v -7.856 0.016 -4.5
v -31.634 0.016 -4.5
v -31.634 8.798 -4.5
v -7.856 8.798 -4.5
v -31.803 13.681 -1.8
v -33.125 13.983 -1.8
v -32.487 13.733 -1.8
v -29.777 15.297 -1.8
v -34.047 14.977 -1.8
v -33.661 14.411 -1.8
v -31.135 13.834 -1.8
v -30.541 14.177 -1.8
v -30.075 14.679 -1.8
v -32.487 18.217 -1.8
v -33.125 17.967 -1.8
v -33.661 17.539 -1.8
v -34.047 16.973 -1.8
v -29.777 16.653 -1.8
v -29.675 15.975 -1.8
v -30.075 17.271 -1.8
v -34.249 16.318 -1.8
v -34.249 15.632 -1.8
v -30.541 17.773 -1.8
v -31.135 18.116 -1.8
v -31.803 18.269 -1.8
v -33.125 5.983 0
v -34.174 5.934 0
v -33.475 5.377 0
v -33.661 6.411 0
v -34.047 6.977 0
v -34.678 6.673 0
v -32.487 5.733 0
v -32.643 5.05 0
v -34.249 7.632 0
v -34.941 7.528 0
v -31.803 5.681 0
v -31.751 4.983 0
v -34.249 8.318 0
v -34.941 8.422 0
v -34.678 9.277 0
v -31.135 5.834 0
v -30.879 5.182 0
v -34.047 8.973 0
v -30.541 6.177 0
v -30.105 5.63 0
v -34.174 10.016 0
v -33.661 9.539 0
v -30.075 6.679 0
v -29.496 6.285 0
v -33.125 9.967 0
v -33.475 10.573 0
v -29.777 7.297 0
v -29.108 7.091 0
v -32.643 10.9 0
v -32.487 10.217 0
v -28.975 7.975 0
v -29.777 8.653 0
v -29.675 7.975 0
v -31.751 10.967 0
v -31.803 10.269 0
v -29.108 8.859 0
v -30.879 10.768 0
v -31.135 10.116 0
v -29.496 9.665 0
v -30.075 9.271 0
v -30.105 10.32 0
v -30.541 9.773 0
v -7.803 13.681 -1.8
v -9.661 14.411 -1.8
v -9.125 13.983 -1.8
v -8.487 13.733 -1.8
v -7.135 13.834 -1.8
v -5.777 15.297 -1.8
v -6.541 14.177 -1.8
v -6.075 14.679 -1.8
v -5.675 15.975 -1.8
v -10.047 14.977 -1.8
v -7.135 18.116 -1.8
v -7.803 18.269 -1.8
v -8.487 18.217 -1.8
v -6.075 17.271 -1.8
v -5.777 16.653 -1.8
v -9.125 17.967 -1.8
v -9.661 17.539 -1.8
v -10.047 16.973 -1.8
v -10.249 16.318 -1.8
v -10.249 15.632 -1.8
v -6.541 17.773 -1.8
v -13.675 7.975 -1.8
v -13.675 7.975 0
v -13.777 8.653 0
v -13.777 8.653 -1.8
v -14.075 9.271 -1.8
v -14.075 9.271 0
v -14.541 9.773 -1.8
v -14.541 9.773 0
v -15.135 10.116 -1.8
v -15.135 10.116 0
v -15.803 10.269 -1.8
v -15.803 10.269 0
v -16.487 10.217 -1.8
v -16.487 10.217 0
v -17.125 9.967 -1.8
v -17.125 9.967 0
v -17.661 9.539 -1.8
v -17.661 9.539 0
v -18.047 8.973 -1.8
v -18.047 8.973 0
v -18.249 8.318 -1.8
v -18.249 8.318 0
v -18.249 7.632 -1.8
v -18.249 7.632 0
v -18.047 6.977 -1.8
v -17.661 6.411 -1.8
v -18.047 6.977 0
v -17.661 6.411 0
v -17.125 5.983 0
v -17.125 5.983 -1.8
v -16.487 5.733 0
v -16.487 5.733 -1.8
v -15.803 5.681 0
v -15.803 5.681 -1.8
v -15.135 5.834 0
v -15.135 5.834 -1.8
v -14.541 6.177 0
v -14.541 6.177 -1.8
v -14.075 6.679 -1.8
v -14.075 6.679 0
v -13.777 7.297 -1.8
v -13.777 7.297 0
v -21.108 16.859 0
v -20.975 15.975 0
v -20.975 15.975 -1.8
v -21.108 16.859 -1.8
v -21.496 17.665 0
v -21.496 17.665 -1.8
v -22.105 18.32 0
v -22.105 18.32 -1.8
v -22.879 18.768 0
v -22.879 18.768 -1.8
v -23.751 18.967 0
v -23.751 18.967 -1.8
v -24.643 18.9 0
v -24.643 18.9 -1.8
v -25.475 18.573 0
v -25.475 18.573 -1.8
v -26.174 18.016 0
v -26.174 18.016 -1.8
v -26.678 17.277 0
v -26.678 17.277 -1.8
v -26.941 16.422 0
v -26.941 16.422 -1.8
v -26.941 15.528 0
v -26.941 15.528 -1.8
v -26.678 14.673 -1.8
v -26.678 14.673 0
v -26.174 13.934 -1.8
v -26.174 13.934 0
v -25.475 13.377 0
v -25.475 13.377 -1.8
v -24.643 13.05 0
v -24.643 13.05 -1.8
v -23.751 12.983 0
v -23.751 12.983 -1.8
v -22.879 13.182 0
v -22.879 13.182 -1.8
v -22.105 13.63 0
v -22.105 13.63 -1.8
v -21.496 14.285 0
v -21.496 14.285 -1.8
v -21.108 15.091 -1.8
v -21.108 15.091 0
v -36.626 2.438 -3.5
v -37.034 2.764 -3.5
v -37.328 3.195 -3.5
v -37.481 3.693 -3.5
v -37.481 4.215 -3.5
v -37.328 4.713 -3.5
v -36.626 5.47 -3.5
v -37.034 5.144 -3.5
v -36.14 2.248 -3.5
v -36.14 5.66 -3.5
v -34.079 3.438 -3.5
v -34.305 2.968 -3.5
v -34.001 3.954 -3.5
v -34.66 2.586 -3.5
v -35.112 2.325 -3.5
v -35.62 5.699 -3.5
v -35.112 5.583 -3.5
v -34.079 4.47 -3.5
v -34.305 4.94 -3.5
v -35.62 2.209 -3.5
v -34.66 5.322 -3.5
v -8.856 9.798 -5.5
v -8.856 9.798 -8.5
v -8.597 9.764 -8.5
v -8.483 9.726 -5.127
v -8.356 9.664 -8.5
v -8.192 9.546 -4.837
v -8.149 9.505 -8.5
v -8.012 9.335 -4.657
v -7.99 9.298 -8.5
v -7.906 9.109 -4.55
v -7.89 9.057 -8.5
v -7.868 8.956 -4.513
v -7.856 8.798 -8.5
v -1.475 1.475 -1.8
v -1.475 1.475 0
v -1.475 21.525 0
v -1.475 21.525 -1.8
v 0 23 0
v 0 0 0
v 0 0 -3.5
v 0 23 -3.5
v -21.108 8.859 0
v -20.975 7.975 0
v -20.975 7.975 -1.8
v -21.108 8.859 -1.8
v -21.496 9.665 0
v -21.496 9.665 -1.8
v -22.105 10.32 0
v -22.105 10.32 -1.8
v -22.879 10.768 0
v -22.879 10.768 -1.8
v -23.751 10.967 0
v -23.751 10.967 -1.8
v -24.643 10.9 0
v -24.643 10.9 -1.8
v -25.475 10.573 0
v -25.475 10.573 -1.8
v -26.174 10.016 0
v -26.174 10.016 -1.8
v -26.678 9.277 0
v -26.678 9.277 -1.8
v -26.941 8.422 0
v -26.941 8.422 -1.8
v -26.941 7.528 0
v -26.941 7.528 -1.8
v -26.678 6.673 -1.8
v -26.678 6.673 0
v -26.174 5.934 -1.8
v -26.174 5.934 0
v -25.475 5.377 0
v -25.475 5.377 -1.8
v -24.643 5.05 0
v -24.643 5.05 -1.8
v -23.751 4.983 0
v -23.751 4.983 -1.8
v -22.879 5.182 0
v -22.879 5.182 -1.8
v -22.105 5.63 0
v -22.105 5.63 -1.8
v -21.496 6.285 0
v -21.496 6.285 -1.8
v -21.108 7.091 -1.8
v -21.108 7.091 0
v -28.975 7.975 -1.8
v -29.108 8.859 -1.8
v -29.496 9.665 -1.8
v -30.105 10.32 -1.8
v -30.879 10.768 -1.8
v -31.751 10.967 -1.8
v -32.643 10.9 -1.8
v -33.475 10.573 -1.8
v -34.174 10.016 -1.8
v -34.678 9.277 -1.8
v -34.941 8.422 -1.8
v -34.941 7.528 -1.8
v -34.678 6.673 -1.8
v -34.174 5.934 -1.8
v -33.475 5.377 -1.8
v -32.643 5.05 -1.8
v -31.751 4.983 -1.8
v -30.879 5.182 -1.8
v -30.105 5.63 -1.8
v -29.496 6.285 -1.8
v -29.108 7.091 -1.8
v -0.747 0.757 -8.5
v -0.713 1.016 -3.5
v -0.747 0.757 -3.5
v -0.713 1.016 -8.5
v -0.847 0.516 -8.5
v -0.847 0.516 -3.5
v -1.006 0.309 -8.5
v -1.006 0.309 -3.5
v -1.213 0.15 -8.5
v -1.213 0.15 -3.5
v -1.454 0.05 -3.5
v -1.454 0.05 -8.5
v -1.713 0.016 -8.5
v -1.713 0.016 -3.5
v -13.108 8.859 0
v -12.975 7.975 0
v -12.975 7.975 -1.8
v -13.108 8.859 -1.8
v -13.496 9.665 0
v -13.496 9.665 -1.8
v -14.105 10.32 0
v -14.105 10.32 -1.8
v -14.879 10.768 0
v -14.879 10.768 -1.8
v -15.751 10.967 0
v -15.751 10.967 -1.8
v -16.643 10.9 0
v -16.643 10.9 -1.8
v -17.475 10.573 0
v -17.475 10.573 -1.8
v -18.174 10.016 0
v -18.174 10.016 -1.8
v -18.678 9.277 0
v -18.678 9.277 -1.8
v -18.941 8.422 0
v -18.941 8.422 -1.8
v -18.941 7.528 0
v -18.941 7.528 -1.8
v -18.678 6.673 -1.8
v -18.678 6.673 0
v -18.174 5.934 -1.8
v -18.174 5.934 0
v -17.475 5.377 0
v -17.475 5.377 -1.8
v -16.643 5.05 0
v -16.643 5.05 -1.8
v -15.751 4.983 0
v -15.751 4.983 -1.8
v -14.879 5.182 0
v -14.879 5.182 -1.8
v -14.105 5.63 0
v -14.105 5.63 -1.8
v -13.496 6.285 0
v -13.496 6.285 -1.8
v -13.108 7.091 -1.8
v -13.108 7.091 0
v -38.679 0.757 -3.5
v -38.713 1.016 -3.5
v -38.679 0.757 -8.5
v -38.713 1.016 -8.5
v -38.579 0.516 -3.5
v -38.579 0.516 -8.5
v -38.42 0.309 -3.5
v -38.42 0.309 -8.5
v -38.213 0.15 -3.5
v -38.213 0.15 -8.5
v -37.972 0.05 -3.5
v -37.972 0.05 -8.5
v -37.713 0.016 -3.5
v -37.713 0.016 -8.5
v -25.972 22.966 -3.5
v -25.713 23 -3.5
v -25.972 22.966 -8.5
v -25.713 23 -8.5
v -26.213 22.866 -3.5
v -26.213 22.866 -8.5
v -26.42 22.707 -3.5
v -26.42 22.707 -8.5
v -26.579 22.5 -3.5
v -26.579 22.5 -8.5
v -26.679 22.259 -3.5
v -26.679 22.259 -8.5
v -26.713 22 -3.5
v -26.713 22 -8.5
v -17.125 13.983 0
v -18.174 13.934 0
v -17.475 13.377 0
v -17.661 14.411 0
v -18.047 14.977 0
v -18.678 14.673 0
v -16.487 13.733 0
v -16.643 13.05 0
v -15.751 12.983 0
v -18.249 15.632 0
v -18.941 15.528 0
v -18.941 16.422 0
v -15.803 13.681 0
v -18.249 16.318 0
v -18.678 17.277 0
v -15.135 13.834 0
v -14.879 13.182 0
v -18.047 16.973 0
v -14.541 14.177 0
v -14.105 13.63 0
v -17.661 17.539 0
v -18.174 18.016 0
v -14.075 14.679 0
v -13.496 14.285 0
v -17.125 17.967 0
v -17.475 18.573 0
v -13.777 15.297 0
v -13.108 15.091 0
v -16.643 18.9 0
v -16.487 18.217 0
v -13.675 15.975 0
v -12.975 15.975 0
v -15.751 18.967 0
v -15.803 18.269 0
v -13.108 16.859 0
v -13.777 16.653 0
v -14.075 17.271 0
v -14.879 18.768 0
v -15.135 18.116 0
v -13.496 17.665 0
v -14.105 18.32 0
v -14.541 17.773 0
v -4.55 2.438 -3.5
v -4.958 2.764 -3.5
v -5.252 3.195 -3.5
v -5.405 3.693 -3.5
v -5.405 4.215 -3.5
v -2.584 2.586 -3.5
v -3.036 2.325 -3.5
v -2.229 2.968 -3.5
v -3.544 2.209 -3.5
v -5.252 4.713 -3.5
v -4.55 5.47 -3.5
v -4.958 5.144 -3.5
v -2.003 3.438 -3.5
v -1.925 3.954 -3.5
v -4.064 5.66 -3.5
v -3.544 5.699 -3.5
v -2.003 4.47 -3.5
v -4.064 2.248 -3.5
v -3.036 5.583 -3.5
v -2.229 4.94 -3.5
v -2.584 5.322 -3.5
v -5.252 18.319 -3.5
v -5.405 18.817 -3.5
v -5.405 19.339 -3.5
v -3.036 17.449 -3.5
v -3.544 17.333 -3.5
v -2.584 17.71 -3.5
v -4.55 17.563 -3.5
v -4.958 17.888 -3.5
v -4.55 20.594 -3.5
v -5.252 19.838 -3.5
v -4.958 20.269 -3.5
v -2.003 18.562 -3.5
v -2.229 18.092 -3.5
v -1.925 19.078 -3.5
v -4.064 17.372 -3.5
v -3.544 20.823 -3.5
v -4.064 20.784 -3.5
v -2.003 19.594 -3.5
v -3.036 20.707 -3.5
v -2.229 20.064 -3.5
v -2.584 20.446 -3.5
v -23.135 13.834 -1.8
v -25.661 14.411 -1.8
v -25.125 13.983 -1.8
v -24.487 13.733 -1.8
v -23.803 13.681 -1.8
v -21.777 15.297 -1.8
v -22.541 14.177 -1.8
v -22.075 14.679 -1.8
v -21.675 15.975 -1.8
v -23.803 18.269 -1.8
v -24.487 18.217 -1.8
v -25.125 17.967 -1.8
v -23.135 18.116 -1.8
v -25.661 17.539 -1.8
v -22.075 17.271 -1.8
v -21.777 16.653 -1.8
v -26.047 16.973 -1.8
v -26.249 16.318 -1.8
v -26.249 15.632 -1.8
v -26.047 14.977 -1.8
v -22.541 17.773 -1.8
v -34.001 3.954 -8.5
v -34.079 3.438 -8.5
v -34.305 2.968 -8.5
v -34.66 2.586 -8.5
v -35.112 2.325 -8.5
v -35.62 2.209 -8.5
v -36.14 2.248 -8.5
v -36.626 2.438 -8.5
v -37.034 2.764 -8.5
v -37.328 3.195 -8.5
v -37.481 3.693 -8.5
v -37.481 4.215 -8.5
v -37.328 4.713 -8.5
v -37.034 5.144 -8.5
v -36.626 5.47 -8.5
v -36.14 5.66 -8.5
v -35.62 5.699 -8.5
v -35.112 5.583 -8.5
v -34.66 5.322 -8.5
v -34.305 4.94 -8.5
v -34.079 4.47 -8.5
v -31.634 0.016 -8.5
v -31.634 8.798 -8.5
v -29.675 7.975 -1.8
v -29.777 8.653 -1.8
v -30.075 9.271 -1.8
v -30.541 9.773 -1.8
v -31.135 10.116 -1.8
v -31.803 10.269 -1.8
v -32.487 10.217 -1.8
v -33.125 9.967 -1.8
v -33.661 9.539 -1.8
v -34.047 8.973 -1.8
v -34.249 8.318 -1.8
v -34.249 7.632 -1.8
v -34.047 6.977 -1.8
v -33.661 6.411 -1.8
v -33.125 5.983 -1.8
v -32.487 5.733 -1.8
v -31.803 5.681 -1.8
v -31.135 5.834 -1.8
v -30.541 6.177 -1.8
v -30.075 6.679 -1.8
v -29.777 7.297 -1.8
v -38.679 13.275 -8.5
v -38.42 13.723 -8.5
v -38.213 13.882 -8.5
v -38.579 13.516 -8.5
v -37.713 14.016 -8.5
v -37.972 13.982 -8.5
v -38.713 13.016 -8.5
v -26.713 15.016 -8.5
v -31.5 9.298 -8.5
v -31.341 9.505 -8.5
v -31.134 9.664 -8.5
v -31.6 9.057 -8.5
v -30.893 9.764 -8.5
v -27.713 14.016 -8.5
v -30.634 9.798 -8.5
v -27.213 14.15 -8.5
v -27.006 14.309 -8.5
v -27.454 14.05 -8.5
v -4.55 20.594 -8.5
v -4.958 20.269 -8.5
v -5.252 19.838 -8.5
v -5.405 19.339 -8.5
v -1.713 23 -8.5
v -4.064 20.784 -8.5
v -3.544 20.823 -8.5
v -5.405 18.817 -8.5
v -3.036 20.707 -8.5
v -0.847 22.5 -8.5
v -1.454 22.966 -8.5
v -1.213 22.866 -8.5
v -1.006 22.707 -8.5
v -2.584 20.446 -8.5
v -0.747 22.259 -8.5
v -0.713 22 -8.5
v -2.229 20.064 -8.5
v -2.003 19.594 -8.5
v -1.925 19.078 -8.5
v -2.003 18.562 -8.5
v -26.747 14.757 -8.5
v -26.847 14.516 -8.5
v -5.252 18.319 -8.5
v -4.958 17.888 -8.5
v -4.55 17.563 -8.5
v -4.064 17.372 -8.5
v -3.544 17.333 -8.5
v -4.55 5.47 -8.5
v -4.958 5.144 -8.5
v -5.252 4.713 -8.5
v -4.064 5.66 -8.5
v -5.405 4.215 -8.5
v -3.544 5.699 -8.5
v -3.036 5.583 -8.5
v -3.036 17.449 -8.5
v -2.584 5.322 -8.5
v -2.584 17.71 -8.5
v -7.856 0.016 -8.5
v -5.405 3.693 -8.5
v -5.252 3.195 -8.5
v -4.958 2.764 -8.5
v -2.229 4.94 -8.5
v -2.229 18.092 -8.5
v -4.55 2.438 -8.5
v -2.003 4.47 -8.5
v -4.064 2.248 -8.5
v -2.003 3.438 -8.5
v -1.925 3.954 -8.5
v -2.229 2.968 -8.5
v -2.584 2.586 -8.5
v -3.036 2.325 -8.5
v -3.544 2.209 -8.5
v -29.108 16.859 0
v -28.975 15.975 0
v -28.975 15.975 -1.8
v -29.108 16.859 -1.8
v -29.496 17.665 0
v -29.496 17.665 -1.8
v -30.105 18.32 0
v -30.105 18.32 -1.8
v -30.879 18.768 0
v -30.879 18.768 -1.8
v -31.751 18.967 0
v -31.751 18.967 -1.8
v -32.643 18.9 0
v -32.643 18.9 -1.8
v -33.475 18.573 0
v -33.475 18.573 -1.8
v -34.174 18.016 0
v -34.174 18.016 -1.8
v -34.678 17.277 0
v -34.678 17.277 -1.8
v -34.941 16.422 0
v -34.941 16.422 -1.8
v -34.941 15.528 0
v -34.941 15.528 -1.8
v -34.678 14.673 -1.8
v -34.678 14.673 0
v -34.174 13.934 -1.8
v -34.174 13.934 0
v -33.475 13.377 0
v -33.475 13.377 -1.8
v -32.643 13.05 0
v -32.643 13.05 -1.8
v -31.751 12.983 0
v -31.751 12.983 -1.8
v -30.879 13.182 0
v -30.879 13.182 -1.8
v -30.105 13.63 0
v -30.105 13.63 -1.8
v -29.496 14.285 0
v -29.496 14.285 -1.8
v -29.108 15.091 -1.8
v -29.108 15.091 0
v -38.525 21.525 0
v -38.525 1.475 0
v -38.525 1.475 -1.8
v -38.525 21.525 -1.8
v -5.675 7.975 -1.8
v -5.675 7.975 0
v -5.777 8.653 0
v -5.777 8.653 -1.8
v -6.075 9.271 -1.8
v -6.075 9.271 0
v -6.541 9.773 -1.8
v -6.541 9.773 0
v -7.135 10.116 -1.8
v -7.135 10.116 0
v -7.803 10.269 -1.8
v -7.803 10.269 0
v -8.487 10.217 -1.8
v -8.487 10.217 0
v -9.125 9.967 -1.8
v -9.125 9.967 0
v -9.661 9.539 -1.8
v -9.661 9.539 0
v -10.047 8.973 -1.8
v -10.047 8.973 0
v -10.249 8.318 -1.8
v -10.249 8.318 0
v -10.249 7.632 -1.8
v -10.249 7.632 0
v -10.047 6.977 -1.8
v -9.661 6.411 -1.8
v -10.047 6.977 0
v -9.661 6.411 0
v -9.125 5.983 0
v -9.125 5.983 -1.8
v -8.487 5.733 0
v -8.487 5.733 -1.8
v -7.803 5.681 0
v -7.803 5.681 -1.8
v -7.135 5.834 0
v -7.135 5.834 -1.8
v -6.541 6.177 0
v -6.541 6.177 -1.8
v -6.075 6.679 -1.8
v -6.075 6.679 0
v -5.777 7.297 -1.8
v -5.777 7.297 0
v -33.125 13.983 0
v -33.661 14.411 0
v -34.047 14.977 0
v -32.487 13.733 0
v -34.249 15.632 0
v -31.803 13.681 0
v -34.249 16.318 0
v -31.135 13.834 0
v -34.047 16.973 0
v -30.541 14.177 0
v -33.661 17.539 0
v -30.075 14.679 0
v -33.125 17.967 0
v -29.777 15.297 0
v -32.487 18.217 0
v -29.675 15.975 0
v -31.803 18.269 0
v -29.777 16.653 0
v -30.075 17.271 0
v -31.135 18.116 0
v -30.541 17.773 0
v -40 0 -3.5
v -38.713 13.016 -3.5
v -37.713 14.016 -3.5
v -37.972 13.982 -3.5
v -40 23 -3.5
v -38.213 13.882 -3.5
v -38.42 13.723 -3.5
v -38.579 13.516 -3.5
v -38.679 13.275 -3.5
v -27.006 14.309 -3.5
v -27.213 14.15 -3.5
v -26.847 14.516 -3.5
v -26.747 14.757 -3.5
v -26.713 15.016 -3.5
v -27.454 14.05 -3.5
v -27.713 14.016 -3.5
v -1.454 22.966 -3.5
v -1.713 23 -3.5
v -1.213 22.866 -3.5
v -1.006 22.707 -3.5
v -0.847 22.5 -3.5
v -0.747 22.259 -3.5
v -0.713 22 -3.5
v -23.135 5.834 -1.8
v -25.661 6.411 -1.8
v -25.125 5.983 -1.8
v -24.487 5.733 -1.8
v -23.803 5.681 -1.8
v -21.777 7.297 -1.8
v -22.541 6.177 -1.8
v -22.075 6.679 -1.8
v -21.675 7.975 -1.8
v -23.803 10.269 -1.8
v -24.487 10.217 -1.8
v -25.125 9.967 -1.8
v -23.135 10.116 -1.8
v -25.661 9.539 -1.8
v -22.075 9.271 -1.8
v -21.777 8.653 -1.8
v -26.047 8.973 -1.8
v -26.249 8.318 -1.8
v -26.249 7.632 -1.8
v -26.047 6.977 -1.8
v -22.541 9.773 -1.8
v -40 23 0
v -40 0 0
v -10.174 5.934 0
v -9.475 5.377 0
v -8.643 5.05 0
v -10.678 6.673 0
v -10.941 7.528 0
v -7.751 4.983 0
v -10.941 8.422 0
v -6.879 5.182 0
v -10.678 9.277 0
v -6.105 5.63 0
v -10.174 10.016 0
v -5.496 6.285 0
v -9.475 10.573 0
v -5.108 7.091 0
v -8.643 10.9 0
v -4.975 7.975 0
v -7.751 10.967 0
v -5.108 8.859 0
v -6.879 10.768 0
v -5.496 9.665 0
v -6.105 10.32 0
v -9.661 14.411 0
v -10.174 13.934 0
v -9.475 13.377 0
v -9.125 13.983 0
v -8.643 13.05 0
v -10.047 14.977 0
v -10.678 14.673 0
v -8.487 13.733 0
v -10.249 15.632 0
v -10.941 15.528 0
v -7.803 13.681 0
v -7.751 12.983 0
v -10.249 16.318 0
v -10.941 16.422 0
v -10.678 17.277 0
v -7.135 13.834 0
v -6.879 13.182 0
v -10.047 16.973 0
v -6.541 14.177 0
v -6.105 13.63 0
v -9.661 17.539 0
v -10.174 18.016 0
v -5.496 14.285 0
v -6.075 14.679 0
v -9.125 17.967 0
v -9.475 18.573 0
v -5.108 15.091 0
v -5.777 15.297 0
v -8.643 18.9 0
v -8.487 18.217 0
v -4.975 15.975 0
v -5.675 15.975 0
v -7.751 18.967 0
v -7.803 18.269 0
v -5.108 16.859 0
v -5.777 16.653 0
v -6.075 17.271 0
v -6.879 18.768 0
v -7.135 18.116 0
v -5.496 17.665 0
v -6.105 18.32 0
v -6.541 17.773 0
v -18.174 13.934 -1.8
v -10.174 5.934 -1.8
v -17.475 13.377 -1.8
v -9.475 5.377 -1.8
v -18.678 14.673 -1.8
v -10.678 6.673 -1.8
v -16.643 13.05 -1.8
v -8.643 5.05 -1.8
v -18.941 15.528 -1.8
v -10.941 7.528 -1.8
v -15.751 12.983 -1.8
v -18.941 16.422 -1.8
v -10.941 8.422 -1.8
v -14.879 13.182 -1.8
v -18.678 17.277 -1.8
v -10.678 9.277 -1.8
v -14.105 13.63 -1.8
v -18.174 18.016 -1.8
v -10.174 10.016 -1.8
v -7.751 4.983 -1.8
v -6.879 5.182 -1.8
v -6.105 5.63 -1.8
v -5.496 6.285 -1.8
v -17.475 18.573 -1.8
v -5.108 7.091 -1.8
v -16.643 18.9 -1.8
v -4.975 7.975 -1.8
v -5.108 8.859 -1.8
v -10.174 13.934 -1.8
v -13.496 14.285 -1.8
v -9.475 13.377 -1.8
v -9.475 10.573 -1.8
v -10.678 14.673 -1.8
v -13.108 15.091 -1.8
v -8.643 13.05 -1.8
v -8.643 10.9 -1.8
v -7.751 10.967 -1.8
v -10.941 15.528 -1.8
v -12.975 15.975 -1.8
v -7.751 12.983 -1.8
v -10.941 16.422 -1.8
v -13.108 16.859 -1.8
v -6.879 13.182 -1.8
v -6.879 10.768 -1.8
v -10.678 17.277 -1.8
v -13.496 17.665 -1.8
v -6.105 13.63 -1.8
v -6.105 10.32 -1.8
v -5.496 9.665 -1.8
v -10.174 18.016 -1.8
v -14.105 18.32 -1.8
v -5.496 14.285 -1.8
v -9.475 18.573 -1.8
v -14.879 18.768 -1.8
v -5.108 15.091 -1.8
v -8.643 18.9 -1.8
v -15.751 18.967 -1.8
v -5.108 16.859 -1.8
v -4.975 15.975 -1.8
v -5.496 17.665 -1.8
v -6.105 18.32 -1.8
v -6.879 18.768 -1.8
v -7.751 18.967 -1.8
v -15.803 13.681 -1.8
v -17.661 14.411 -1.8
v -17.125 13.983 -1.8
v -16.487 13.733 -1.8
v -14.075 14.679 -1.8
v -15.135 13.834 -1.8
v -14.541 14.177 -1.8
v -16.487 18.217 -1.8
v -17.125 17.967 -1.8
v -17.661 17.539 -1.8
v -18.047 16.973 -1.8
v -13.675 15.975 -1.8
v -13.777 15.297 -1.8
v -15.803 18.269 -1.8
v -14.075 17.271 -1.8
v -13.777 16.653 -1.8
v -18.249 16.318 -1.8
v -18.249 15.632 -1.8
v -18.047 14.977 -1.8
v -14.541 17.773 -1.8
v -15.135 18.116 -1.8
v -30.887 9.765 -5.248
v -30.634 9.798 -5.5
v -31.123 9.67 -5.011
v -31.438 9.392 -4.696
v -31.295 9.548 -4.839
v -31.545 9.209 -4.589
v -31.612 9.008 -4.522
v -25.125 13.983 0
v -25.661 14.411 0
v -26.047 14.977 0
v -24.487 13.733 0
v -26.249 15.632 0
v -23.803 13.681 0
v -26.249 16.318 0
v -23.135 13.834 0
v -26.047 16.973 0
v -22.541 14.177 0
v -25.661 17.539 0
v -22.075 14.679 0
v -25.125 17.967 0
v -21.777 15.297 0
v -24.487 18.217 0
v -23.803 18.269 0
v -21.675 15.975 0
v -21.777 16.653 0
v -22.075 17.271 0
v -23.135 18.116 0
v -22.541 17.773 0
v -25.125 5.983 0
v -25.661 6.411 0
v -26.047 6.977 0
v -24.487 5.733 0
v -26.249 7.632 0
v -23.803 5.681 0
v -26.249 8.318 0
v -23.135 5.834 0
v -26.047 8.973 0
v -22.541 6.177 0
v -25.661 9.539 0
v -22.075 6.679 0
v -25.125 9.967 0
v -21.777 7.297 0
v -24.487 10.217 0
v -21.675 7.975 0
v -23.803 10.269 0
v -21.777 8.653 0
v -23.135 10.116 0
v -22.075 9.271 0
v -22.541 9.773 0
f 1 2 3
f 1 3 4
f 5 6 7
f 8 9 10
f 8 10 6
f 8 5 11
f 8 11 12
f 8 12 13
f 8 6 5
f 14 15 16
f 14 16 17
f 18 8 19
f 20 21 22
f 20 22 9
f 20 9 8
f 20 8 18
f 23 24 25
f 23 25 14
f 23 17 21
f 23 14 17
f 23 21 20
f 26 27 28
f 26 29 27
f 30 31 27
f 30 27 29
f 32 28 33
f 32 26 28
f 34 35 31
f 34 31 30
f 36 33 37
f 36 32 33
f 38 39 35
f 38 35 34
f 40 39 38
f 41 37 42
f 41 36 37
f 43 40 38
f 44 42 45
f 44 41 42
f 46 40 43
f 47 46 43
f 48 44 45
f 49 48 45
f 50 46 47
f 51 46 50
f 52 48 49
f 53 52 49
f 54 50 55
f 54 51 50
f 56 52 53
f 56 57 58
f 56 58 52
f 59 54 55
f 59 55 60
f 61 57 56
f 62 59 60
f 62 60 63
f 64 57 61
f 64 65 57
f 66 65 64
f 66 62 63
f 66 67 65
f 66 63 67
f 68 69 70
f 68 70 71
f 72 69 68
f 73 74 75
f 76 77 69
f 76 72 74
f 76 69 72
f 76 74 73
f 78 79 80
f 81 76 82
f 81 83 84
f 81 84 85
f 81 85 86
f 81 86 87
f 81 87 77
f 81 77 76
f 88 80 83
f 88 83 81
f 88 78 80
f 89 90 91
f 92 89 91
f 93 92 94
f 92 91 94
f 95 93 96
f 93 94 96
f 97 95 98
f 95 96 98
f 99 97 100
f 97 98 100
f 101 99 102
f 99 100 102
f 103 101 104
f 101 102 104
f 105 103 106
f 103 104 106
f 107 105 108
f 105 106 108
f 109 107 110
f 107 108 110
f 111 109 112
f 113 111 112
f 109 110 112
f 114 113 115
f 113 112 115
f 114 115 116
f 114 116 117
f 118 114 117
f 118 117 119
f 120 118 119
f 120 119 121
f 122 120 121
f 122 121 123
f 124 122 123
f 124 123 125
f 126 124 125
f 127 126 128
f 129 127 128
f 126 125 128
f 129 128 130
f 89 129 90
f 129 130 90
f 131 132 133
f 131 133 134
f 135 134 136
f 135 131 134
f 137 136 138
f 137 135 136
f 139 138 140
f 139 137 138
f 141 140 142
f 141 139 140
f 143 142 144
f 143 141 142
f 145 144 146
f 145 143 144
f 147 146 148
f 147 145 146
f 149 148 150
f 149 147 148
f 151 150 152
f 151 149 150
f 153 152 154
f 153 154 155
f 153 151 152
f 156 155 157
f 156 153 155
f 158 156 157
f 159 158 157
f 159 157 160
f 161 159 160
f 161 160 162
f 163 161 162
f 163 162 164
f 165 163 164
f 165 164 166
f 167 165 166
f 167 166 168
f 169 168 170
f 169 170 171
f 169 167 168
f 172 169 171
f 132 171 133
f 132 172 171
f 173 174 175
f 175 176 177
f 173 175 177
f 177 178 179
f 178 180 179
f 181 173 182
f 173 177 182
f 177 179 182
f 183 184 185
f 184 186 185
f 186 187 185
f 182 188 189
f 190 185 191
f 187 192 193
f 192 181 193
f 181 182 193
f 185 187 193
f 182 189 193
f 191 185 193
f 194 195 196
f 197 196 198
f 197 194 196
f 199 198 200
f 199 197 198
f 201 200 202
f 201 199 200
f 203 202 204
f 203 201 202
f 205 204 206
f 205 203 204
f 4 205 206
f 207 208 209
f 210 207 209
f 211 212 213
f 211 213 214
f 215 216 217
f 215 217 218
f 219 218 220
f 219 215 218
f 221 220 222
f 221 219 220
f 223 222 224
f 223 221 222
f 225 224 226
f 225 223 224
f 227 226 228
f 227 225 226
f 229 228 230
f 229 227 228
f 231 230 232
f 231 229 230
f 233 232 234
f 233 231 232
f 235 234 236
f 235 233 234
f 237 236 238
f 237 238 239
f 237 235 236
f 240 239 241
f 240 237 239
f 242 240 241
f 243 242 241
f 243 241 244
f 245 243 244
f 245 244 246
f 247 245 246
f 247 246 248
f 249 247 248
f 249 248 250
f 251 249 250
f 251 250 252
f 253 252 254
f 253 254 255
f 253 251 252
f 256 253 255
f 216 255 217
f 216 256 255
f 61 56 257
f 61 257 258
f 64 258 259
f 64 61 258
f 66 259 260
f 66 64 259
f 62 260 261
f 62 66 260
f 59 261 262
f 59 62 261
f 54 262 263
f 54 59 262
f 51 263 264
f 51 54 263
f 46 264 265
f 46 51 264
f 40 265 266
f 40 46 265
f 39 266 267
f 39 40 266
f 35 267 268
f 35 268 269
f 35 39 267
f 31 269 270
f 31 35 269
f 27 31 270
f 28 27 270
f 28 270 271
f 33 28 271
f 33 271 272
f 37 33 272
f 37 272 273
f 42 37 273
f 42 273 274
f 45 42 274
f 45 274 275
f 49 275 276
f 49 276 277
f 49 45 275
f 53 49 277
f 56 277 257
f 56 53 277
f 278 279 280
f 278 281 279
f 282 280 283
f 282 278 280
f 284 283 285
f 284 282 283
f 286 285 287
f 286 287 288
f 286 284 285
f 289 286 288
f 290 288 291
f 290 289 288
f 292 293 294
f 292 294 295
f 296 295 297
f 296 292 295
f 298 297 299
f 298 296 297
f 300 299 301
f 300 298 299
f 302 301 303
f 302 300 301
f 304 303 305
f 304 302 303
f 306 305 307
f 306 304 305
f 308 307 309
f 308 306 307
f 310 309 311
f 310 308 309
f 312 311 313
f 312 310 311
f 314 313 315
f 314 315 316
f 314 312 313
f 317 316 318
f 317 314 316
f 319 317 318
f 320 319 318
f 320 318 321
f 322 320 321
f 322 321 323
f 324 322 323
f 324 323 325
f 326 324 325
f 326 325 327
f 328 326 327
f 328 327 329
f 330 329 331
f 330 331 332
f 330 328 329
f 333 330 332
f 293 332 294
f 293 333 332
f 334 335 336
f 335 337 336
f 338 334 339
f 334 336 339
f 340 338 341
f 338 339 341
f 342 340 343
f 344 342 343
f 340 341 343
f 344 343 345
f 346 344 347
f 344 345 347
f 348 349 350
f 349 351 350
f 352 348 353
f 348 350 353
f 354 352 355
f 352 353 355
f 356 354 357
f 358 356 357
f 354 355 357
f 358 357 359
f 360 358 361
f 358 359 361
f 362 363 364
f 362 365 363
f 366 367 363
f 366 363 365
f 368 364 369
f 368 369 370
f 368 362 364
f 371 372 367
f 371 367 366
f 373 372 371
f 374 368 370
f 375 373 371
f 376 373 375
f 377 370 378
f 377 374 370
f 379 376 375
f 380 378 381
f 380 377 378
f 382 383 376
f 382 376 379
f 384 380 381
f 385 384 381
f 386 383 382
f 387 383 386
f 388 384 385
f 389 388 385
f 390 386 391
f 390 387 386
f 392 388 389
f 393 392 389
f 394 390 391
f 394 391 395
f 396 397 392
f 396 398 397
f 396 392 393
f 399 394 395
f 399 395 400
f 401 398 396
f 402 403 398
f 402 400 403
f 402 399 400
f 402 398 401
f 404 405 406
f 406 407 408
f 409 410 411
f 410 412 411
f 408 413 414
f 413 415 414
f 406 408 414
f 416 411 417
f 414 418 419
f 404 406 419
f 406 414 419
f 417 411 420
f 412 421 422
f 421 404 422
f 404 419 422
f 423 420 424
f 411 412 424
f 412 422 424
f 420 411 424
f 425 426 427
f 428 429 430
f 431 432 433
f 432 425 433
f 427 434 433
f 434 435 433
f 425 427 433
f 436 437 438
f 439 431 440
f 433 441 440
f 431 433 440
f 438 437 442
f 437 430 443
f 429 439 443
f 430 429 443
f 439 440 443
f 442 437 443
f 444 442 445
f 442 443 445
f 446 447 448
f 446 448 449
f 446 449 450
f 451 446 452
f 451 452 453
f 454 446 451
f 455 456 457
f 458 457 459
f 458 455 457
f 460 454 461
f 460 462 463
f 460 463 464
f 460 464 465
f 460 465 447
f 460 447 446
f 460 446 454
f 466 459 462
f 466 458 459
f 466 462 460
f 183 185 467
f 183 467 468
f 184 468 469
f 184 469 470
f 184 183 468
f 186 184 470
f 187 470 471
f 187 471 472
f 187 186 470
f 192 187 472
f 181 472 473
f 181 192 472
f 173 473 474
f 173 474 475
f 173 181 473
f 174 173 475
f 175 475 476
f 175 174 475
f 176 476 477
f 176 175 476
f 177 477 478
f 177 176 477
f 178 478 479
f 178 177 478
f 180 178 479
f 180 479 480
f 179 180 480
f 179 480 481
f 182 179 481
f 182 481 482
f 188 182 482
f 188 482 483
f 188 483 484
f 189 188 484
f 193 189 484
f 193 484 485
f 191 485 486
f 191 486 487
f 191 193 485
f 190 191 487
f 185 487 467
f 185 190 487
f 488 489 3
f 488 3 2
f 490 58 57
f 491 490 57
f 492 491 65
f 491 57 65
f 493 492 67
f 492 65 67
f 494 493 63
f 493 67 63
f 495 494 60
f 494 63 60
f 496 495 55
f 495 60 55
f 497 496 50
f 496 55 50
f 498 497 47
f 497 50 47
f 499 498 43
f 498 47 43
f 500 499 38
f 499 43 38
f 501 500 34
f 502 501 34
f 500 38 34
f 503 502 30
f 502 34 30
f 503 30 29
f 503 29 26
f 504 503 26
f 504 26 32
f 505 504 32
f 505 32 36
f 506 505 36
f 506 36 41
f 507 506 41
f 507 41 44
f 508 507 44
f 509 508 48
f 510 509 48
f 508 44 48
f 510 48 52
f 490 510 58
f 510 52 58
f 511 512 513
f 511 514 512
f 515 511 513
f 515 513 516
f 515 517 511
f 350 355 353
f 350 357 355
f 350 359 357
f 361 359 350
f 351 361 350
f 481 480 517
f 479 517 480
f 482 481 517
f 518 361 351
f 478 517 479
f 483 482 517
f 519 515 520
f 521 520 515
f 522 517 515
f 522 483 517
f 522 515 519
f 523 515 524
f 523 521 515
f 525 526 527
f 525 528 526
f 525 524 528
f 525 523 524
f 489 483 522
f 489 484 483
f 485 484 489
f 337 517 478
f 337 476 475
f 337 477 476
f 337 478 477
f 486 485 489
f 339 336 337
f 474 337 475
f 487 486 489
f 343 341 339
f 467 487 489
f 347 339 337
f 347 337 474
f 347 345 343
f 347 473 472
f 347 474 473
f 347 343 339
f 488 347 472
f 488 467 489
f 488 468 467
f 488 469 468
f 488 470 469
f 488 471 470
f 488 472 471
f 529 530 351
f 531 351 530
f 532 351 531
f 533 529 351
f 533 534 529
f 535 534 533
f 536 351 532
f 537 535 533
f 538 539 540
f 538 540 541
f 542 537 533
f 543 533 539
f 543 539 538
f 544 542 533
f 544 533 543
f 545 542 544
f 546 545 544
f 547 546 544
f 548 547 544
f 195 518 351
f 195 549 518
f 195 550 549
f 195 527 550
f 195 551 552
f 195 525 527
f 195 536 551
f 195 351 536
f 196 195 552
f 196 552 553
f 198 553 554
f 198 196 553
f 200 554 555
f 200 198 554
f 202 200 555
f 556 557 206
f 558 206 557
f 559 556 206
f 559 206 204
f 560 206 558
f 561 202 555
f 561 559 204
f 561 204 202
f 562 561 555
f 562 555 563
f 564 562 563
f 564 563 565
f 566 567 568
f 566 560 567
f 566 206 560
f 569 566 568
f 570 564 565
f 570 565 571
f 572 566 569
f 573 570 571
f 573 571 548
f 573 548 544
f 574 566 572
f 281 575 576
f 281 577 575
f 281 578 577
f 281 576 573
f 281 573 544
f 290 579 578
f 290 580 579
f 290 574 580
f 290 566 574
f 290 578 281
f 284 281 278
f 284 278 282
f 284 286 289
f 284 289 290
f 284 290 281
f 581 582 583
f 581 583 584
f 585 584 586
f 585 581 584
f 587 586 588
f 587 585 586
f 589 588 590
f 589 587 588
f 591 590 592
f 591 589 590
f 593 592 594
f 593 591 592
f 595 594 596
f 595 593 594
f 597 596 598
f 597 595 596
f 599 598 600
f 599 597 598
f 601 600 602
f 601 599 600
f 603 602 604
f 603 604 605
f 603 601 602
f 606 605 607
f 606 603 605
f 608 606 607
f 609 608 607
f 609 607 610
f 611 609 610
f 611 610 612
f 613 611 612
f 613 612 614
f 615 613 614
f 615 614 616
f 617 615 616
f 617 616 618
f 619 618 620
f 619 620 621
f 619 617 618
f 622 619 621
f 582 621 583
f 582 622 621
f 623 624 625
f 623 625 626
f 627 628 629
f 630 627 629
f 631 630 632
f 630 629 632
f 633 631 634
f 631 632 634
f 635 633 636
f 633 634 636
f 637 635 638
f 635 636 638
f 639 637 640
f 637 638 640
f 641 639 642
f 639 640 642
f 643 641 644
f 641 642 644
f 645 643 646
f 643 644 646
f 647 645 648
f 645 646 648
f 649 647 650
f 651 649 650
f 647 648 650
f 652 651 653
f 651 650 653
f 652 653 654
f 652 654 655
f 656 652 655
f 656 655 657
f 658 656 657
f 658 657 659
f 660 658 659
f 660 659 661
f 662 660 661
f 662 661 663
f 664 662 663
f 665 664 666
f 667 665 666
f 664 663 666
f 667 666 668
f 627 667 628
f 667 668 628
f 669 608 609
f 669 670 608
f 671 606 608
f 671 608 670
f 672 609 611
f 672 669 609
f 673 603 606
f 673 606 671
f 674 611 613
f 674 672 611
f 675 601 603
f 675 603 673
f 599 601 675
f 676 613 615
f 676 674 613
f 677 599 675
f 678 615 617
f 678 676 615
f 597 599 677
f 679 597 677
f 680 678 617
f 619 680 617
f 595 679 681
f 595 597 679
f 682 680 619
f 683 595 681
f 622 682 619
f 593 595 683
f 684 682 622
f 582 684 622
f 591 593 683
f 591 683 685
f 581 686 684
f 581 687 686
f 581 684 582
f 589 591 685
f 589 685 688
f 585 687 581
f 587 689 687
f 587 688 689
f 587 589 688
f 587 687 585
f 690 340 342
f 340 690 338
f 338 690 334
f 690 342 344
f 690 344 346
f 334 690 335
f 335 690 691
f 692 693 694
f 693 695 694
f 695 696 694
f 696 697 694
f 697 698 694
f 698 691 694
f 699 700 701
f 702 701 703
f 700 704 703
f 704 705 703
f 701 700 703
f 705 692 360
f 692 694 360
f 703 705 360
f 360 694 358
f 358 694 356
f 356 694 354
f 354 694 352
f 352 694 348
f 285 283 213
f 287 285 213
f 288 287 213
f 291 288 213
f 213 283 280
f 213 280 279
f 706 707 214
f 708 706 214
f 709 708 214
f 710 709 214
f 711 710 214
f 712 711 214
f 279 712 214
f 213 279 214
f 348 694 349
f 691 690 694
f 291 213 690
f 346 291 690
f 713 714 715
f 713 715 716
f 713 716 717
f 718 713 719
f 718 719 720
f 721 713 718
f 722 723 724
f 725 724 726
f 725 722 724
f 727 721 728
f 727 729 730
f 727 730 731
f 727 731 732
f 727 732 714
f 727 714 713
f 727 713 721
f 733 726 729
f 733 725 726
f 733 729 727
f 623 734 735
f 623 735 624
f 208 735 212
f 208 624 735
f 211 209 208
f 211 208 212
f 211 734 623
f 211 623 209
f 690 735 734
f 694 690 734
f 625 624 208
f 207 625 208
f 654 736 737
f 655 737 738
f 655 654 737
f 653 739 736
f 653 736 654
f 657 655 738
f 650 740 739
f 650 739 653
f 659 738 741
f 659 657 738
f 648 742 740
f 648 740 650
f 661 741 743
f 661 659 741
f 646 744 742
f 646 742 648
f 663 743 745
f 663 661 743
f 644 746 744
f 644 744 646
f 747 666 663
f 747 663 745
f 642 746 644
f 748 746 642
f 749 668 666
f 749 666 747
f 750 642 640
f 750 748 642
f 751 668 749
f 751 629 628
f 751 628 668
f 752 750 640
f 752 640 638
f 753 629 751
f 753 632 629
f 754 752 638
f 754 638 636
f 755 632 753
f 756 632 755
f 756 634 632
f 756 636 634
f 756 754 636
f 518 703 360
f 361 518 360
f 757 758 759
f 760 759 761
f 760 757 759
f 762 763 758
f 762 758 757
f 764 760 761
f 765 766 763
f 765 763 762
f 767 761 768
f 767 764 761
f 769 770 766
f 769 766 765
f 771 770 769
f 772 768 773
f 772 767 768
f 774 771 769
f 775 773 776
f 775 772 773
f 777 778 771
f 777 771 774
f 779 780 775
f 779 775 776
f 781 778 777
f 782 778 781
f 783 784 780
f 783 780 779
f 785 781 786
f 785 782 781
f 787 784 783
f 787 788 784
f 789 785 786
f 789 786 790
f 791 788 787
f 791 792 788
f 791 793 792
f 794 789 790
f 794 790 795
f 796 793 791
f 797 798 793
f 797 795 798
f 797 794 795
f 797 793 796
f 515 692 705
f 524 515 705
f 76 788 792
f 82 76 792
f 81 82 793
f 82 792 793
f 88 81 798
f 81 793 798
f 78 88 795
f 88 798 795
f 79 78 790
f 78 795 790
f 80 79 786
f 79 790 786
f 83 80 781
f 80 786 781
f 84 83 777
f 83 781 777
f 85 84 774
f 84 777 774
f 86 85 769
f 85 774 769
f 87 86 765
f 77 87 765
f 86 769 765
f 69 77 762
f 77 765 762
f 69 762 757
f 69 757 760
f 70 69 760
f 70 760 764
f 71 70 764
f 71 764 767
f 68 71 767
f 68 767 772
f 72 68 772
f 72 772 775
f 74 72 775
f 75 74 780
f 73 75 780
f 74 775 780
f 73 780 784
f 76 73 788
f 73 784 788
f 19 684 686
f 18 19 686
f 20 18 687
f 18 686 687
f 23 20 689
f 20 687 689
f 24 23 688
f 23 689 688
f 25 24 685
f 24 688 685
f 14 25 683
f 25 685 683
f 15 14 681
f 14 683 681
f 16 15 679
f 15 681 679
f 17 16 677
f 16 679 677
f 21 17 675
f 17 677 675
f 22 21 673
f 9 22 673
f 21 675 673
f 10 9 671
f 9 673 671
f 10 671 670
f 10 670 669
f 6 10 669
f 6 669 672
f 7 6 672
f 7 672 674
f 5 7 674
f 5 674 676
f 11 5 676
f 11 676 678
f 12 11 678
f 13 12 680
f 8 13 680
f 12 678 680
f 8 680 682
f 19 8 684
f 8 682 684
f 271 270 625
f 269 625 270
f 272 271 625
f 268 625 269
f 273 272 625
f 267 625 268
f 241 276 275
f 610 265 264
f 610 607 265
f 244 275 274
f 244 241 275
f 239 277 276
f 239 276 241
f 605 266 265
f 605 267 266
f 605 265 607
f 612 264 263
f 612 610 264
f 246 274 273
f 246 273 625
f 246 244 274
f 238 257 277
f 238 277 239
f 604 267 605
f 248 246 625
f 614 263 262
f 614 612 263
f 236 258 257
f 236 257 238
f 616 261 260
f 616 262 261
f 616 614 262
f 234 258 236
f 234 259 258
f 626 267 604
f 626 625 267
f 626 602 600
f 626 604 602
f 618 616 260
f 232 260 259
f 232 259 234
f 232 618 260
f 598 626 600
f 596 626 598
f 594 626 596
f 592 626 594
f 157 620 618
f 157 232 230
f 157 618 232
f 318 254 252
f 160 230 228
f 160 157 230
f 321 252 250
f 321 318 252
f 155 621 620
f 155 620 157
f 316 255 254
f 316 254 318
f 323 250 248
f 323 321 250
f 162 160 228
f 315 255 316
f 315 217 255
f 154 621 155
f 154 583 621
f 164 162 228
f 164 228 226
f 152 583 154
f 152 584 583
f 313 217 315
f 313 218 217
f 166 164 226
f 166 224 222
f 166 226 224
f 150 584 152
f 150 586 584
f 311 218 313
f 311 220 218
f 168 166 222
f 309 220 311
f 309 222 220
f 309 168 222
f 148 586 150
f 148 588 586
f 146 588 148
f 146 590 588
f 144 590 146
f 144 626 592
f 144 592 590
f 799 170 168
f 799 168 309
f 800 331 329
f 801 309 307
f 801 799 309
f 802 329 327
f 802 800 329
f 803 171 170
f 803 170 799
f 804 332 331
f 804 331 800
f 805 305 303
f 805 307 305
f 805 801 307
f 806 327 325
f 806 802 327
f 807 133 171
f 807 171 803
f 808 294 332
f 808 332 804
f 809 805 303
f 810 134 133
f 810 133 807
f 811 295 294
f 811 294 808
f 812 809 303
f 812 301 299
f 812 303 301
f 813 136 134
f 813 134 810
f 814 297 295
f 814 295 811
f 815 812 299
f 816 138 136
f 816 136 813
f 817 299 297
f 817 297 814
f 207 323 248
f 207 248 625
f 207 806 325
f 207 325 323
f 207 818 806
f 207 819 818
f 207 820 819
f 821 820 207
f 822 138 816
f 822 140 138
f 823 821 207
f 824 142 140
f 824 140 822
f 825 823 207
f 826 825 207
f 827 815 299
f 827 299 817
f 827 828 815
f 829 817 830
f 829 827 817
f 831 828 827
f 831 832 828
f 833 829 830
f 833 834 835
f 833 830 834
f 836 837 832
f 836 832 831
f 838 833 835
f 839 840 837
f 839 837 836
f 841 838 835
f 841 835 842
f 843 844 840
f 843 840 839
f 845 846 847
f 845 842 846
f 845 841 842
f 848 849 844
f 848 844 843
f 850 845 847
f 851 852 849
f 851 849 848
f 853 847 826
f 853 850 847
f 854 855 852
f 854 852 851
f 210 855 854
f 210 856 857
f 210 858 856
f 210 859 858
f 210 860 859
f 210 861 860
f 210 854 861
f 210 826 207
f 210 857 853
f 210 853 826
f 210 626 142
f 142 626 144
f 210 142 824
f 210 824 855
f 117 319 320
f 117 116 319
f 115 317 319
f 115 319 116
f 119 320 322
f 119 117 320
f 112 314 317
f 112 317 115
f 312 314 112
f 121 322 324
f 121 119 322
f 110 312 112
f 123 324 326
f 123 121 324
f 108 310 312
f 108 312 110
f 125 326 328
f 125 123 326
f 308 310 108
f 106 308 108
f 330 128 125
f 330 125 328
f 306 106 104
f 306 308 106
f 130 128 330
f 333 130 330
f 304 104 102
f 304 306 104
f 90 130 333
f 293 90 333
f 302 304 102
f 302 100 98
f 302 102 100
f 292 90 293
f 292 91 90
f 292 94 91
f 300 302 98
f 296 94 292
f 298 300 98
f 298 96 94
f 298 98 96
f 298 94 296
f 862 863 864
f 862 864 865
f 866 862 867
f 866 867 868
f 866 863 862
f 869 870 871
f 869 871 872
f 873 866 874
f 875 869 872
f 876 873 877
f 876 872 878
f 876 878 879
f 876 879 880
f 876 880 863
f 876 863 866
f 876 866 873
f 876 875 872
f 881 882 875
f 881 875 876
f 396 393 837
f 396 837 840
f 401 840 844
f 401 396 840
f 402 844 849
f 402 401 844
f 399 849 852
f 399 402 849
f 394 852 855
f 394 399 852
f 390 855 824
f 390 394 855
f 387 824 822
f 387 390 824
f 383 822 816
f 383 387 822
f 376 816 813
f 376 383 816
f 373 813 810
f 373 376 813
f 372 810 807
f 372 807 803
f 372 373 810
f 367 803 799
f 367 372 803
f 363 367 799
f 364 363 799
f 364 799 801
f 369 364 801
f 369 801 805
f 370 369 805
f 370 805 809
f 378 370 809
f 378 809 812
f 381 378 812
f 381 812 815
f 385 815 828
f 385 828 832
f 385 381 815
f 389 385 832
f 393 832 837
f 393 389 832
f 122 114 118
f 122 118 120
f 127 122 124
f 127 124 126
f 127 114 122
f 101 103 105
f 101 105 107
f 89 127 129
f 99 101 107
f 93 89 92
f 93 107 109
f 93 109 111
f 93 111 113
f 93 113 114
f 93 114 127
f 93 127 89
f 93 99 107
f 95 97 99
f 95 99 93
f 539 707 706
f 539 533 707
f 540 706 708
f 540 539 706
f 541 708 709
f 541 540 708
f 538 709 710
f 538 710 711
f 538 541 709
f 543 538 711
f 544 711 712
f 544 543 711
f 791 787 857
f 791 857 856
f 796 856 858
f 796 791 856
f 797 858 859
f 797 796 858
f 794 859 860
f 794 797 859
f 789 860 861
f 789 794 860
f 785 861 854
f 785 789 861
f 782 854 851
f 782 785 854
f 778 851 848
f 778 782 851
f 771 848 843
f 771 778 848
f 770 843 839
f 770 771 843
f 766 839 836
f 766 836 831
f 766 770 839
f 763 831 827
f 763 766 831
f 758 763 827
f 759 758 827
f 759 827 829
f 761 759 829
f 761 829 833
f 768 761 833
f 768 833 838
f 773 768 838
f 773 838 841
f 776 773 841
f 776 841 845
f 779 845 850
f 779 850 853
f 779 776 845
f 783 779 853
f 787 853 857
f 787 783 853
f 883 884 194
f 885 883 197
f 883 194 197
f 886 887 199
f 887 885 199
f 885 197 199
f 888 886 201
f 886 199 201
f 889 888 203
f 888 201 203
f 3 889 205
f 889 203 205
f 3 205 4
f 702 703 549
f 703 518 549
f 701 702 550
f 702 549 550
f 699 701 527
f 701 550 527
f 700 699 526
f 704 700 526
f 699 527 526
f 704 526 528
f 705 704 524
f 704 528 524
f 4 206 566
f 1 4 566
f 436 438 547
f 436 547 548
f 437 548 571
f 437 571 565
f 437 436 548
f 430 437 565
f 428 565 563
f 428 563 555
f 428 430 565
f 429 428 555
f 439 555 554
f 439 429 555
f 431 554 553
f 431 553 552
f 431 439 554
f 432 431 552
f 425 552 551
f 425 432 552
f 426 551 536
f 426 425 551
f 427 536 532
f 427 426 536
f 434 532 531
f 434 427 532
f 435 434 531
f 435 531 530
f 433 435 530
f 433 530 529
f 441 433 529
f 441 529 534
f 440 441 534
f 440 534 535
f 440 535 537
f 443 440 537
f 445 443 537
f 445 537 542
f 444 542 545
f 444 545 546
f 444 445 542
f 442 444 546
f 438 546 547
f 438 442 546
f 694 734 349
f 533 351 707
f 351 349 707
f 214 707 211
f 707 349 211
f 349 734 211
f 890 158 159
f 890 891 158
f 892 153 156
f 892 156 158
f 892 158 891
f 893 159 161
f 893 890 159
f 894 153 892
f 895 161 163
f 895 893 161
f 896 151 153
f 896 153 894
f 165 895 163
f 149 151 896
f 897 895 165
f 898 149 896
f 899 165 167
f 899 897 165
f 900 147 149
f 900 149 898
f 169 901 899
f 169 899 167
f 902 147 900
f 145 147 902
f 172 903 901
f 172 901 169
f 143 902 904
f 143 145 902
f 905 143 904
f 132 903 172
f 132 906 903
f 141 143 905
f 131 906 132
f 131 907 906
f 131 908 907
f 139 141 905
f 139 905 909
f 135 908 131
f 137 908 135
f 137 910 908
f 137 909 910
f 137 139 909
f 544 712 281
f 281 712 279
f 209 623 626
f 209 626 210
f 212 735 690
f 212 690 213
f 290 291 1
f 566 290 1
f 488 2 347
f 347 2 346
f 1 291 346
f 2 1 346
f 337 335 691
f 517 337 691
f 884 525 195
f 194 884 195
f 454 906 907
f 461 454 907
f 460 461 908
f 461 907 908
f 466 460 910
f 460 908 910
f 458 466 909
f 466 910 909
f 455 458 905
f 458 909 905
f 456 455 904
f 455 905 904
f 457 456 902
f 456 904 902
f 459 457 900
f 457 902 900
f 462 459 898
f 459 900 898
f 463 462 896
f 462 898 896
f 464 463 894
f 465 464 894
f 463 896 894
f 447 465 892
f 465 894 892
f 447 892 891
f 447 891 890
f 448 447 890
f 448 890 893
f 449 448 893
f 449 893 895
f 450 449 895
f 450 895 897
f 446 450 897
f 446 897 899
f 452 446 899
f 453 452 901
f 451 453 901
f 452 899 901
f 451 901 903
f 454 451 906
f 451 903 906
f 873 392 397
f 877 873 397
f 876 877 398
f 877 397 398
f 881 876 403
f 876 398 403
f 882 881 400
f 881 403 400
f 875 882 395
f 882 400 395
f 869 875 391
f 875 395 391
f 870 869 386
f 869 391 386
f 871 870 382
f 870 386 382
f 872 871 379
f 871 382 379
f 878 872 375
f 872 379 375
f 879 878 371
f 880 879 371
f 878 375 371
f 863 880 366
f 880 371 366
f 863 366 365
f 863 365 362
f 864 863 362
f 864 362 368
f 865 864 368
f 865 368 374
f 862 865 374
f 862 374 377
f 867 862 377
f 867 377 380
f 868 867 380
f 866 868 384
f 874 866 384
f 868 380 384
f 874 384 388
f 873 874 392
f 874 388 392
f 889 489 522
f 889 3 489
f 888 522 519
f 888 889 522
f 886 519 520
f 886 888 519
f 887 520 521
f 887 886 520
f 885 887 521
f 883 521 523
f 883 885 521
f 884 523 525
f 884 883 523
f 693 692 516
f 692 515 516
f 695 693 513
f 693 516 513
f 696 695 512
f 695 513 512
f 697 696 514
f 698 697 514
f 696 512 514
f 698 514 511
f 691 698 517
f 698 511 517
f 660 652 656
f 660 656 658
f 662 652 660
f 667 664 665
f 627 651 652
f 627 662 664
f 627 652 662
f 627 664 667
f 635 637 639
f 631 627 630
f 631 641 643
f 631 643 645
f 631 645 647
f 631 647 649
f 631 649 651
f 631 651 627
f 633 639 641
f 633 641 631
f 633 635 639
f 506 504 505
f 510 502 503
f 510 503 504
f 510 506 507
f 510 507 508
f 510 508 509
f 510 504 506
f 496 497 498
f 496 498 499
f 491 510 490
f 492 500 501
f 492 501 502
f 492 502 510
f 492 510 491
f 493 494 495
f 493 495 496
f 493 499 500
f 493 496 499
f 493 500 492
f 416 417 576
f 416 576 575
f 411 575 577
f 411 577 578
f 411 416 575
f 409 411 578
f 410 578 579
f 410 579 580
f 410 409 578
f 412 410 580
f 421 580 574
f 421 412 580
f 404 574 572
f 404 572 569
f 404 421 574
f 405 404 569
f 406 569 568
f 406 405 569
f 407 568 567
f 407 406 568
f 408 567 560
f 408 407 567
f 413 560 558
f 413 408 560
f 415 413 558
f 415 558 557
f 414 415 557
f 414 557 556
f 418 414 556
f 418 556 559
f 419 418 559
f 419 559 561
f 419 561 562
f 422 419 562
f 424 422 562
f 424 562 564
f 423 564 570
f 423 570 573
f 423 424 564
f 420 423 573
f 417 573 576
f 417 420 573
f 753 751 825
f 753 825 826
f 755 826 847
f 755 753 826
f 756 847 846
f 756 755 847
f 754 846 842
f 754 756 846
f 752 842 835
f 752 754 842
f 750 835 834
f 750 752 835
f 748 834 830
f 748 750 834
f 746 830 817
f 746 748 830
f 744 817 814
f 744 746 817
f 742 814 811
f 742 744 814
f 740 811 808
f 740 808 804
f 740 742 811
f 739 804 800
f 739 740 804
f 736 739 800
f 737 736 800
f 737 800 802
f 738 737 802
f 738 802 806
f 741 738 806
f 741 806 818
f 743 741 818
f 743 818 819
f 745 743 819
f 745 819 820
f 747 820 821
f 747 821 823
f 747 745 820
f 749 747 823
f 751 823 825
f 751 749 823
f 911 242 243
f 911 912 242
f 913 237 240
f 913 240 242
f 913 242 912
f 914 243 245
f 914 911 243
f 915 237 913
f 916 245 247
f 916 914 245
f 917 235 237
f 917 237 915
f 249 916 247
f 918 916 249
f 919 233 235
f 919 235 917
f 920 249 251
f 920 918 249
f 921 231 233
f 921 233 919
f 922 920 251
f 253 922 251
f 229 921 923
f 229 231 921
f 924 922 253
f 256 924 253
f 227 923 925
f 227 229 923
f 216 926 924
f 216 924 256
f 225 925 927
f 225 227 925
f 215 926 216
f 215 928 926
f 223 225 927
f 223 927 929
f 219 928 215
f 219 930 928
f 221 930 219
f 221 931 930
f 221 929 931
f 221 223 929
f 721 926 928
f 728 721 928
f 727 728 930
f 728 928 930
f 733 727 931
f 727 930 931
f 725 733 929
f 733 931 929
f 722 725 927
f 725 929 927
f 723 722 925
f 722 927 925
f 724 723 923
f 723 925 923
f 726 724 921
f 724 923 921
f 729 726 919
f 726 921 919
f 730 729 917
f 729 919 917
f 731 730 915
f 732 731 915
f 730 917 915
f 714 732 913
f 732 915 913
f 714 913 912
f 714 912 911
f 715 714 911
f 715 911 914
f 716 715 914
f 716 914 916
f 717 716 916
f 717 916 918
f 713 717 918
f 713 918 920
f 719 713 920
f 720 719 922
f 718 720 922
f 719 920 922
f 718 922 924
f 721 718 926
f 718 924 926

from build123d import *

# Parameters (mm, degrees)
F0_W     = 40
F0_H     = 23
F1_DEPTH = 3.5
F2_W     = 37.05
F2_H     = 20.05
F2_R     = 3
F3_R     = 2.3
F4_DEPTH = 1.8
F5_R     = 1.75
F6_DEPTH = 5
F7_W     = 23.7783156335
F7_H     = 9.781668779
F8_DEPTH = 4
F9_R     = 1


with BuildPart() as f1:
    # F0 (on Top) → F1 (new body)
    with BuildSketch(Plane.XY):
        with Locations((-20, 11.5)):
            Rectangle(F0_W, F0_H)
    extrude(amount=-F1_DEPTH)

    # F2 (on Top) + F3 (on face) → F4 (cut)
    with BuildSketch(Plane.XY):
        with Locations((-20, 11.5)):
            Rectangle(F2_W, F2_H)
        with Locations((-31.975, 7.975)):
            Circle(F2_R, mode=Mode.SUBTRACT)
        with Locations((-23.975, 7.975)):
            Circle(F2_R, mode=Mode.SUBTRACT)
        with Locations((-15.975, 7.975)):
            Circle(F2_R, mode=Mode.SUBTRACT)
        with Locations((-7.975, 7.975)):
            Circle(F2_R, mode=Mode.SUBTRACT)
        with Locations((-31.975, 15.975)):
            Circle(F2_R, mode=Mode.SUBTRACT)
        with Locations((-23.975, 15.975)):
            Circle(F2_R, mode=Mode.SUBTRACT)
        with Locations((-15.975, 15.975)):
            Circle(F2_R, mode=Mode.SUBTRACT)
        with Locations((-7.975, 15.975)):
            Circle(F2_R, mode=Mode.SUBTRACT)
    with BuildSketch(Plane.XY):
        with Locations((-7.975, 7.975)):
            Circle(F3_R)
        with Locations((-7.975, 15.975)):
            Circle(F3_R)
        with Locations((-15.975, 7.975)):
            Circle(F3_R)
        with Locations((-15.975, 15.975)):
            Circle(F3_R)
        with Locations((-23.975, 7.975)):
            Circle(F3_R)
        with Locations((-23.975, 15.975)):
            Circle(F3_R)
        with Locations((-31.975, 7.975)):
            Circle(F3_R)
        with Locations((-31.975, 15.975)):
            Circle(F3_R)
    extrude(amount=-F4_DEPTH, mode=Mode.SUBTRACT)

    # F5 (on face) → F6 (join)
    with BuildSketch(Plane(origin=(0, 0, -3.5), x_dir=(1, 0, 0), z_dir=(0, 0, -1))):
        Polygon((-26.7129692488, -23), (-0.7129692488, -23), (-0.7129692488, -0.0161129268), (-38.7129692488, -0.0161129268), (-38.7129692488, -14.0161129268), (-26.7129692488, -14.0161129268), align=None)
        with Locations((-3.6750413084, -19.0782622429)):
            Circle(F5_R, mode=Mode.SUBTRACT)
        with Locations((-35.7508971893, -3.9539636107)):
            Circle(F5_R, mode=Mode.SUBTRACT)
        with Locations((-3.6750413084, -3.9539636107)):
            Circle(F5_R, mode=Mode.SUBTRACT)
    extrude(amount=F6_DEPTH)

    # F7 (on face) → F8 (cut)
    with BuildSketch(Plane(origin=(0, 0, -8.5), x_dir=(1, 0, 0), z_dir=(0, 0, -1))):
        with Locations((-19.7449307889, -4.9069473163)):
            Rectangle(F7_W, F7_H)
    extrude(amount=-F8_DEPTH, mode=Mode.SUBTRACT)

    # F9
    f9_edges = [f1.edges().sort_by_distance(p)[0] for p in [
        (-31.634089, 9.797782, -6.5),
        (-7.855773, 9.797782, -6.5),
        (-26.712969, 14.016113, -6),
        (-19.744931, 9.797782, -4.5),
        (-0.712969, 0.016113, -6),
        (-38.712969, 0.016113, -6),
        (-38.712969, 14.016113, -6),
        (-26.712969, 23, -6),
        (-0.712969, 23, -6),
    ]]
    fillet(f9_edges, radius=F9_R)


solid = f1.part
